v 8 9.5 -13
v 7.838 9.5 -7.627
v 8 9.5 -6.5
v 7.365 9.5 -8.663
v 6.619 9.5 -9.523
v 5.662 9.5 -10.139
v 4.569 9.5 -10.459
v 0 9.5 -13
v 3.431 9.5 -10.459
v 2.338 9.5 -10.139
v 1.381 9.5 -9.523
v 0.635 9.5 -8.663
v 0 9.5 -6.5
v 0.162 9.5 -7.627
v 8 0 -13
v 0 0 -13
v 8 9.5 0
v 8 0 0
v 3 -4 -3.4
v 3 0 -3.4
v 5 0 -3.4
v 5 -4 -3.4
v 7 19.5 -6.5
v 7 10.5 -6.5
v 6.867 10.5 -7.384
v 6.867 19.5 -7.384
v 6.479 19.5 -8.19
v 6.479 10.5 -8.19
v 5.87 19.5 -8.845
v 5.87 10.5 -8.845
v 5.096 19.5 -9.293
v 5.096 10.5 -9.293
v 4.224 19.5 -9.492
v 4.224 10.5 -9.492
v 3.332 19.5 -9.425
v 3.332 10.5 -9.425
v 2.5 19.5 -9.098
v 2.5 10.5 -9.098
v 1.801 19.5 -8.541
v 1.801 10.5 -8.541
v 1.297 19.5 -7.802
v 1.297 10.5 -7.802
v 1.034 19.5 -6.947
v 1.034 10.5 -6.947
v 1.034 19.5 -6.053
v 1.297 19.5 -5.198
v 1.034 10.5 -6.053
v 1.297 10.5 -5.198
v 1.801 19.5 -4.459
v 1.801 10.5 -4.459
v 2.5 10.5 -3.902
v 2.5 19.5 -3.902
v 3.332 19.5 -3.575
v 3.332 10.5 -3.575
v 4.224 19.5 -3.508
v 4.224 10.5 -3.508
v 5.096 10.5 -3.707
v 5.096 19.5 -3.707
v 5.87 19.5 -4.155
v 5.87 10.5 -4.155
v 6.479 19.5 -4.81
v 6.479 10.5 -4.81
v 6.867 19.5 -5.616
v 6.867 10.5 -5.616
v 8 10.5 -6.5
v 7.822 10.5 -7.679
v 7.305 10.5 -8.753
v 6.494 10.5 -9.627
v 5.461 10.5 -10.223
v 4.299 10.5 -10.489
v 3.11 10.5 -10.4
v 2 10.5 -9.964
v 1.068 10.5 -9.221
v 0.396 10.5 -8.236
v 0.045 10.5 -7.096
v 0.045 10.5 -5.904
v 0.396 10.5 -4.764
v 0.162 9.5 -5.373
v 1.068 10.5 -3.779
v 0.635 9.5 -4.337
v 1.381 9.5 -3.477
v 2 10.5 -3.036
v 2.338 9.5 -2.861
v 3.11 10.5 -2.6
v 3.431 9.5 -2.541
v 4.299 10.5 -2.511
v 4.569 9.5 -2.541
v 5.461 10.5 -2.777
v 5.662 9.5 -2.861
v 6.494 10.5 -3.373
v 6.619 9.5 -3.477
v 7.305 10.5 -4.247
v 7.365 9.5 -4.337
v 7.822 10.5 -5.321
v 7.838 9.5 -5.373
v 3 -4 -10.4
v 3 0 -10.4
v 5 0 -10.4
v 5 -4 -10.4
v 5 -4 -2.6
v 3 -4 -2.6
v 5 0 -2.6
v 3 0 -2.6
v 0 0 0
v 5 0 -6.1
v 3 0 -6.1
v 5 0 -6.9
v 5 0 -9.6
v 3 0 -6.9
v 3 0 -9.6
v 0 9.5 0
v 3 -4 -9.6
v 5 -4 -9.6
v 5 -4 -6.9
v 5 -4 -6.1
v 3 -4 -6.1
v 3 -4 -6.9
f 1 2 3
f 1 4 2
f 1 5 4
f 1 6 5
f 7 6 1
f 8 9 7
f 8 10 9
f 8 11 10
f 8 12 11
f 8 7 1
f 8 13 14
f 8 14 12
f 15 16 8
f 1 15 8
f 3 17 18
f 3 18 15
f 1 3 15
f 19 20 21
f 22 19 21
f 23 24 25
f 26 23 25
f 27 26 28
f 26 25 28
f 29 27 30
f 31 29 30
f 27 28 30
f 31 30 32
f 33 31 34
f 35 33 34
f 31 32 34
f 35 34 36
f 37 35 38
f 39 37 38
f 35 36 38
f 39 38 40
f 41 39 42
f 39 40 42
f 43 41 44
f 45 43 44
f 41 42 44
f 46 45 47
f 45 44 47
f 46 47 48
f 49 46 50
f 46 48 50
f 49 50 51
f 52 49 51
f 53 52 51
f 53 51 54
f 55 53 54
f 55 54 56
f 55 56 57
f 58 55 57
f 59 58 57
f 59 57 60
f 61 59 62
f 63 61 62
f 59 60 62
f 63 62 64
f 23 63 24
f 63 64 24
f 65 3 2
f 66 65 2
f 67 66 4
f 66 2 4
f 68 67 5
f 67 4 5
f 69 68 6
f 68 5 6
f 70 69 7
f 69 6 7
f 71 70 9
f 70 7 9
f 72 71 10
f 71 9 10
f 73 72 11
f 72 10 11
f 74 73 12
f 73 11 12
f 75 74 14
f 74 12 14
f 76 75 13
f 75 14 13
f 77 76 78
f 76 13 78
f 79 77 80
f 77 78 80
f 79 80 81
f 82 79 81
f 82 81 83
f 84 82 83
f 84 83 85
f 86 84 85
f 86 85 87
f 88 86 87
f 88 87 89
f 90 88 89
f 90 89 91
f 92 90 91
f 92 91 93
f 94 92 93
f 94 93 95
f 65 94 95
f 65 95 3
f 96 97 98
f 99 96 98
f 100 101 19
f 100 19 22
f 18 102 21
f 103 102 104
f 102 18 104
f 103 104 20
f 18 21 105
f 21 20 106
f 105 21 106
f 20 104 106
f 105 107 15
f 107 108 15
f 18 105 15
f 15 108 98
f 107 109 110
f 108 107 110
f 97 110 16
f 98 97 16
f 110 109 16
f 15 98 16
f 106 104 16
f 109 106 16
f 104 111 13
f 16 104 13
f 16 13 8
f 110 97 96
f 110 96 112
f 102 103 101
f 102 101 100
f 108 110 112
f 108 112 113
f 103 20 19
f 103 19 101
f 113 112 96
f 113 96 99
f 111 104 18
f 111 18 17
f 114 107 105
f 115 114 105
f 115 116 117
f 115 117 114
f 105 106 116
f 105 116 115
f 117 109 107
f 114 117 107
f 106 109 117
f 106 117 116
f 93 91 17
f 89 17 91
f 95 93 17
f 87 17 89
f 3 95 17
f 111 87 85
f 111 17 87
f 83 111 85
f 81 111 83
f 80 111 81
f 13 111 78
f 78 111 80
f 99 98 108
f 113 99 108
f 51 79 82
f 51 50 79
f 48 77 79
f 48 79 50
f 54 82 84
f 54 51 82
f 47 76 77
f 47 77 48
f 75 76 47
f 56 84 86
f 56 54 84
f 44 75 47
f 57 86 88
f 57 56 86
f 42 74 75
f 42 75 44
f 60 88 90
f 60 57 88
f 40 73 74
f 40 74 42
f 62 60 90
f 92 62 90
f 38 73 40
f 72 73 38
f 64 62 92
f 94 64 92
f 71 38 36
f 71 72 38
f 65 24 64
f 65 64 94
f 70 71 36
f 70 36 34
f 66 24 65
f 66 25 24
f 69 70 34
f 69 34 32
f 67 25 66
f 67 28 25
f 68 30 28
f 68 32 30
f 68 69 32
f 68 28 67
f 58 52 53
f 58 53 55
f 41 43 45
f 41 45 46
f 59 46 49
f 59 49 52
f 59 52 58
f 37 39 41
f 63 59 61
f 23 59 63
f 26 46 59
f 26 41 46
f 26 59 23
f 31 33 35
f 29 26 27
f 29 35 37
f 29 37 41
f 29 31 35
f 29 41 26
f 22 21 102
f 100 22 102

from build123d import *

# Parameters (mm, degrees)
ESQUISSE1_W        = 13
ESQUISSE1_H        = 9.5
BOSS_EXTRU_1_DEPTH = 8
ESQUISSE2_R        = 4
BOSS_EXTRU_2_DEPTH = 1
ESQUISSE3_R        = 3
BOSS_EXTRU_3_DEPTH = 9
ESQUISSE4_W        = 2
ESQUISSE4_H        = 0.8
BOSS_EXTRU_4_DEPTH = 4


with BuildPart() as part:
    # Esquisse1 → Boss.-Extru.1 (new body)
    with BuildSketch(Plane(origin=(0, 0, 0), x_dir=(0, 0, -1), z_dir=(1, 0, 0))):
        with Locations((6.5, 4.75)):
            Rectangle(ESQUISSE1_W, ESQUISSE1_H)
    extrude(amount=BOSS_EXTRU_1_DEPTH)

    # Esquisse2 → Boss.-Extru.2 (add)
    with BuildSketch(Plane(origin=(0, 9.5, 0), x_dir=(1, 0, 0), z_dir=(0, 1, 0))):
        with Locations((4, 6.5)):
            Circle(ESQUISSE2_R)
    extrude(amount=BOSS_EXTRU_2_DEPTH)

    # Esquisse3 → Boss.-Extru.3 (add)
    with BuildSketch(Plane(origin=(0, 10.5, 0), x_dir=(1, 0, 0), z_dir=(0, 1, 0))):
        with Locations((4, 6.5)):
            Circle(ESQUISSE3_R)
    extrude(amount=BOSS_EXTRU_3_DEPTH)

    # Esquisse4 → Boss.-Extru.4 (add)
    with BuildSketch(Plane.XZ):
        with Locations((4, -3)):
            Rectangle(ESQUISSE4_W, ESQUISSE4_H)
        with Locations((4, -6.5)):
            Rectangle(ESQUISSE4_W, ESQUISSE4_H)
        with Locations((4, -10)):
            Rectangle(ESQUISSE4_W, ESQUISSE4_H)
    extrude(amount=BOSS_EXTRU_4_DEPTH)


solid = part.part
